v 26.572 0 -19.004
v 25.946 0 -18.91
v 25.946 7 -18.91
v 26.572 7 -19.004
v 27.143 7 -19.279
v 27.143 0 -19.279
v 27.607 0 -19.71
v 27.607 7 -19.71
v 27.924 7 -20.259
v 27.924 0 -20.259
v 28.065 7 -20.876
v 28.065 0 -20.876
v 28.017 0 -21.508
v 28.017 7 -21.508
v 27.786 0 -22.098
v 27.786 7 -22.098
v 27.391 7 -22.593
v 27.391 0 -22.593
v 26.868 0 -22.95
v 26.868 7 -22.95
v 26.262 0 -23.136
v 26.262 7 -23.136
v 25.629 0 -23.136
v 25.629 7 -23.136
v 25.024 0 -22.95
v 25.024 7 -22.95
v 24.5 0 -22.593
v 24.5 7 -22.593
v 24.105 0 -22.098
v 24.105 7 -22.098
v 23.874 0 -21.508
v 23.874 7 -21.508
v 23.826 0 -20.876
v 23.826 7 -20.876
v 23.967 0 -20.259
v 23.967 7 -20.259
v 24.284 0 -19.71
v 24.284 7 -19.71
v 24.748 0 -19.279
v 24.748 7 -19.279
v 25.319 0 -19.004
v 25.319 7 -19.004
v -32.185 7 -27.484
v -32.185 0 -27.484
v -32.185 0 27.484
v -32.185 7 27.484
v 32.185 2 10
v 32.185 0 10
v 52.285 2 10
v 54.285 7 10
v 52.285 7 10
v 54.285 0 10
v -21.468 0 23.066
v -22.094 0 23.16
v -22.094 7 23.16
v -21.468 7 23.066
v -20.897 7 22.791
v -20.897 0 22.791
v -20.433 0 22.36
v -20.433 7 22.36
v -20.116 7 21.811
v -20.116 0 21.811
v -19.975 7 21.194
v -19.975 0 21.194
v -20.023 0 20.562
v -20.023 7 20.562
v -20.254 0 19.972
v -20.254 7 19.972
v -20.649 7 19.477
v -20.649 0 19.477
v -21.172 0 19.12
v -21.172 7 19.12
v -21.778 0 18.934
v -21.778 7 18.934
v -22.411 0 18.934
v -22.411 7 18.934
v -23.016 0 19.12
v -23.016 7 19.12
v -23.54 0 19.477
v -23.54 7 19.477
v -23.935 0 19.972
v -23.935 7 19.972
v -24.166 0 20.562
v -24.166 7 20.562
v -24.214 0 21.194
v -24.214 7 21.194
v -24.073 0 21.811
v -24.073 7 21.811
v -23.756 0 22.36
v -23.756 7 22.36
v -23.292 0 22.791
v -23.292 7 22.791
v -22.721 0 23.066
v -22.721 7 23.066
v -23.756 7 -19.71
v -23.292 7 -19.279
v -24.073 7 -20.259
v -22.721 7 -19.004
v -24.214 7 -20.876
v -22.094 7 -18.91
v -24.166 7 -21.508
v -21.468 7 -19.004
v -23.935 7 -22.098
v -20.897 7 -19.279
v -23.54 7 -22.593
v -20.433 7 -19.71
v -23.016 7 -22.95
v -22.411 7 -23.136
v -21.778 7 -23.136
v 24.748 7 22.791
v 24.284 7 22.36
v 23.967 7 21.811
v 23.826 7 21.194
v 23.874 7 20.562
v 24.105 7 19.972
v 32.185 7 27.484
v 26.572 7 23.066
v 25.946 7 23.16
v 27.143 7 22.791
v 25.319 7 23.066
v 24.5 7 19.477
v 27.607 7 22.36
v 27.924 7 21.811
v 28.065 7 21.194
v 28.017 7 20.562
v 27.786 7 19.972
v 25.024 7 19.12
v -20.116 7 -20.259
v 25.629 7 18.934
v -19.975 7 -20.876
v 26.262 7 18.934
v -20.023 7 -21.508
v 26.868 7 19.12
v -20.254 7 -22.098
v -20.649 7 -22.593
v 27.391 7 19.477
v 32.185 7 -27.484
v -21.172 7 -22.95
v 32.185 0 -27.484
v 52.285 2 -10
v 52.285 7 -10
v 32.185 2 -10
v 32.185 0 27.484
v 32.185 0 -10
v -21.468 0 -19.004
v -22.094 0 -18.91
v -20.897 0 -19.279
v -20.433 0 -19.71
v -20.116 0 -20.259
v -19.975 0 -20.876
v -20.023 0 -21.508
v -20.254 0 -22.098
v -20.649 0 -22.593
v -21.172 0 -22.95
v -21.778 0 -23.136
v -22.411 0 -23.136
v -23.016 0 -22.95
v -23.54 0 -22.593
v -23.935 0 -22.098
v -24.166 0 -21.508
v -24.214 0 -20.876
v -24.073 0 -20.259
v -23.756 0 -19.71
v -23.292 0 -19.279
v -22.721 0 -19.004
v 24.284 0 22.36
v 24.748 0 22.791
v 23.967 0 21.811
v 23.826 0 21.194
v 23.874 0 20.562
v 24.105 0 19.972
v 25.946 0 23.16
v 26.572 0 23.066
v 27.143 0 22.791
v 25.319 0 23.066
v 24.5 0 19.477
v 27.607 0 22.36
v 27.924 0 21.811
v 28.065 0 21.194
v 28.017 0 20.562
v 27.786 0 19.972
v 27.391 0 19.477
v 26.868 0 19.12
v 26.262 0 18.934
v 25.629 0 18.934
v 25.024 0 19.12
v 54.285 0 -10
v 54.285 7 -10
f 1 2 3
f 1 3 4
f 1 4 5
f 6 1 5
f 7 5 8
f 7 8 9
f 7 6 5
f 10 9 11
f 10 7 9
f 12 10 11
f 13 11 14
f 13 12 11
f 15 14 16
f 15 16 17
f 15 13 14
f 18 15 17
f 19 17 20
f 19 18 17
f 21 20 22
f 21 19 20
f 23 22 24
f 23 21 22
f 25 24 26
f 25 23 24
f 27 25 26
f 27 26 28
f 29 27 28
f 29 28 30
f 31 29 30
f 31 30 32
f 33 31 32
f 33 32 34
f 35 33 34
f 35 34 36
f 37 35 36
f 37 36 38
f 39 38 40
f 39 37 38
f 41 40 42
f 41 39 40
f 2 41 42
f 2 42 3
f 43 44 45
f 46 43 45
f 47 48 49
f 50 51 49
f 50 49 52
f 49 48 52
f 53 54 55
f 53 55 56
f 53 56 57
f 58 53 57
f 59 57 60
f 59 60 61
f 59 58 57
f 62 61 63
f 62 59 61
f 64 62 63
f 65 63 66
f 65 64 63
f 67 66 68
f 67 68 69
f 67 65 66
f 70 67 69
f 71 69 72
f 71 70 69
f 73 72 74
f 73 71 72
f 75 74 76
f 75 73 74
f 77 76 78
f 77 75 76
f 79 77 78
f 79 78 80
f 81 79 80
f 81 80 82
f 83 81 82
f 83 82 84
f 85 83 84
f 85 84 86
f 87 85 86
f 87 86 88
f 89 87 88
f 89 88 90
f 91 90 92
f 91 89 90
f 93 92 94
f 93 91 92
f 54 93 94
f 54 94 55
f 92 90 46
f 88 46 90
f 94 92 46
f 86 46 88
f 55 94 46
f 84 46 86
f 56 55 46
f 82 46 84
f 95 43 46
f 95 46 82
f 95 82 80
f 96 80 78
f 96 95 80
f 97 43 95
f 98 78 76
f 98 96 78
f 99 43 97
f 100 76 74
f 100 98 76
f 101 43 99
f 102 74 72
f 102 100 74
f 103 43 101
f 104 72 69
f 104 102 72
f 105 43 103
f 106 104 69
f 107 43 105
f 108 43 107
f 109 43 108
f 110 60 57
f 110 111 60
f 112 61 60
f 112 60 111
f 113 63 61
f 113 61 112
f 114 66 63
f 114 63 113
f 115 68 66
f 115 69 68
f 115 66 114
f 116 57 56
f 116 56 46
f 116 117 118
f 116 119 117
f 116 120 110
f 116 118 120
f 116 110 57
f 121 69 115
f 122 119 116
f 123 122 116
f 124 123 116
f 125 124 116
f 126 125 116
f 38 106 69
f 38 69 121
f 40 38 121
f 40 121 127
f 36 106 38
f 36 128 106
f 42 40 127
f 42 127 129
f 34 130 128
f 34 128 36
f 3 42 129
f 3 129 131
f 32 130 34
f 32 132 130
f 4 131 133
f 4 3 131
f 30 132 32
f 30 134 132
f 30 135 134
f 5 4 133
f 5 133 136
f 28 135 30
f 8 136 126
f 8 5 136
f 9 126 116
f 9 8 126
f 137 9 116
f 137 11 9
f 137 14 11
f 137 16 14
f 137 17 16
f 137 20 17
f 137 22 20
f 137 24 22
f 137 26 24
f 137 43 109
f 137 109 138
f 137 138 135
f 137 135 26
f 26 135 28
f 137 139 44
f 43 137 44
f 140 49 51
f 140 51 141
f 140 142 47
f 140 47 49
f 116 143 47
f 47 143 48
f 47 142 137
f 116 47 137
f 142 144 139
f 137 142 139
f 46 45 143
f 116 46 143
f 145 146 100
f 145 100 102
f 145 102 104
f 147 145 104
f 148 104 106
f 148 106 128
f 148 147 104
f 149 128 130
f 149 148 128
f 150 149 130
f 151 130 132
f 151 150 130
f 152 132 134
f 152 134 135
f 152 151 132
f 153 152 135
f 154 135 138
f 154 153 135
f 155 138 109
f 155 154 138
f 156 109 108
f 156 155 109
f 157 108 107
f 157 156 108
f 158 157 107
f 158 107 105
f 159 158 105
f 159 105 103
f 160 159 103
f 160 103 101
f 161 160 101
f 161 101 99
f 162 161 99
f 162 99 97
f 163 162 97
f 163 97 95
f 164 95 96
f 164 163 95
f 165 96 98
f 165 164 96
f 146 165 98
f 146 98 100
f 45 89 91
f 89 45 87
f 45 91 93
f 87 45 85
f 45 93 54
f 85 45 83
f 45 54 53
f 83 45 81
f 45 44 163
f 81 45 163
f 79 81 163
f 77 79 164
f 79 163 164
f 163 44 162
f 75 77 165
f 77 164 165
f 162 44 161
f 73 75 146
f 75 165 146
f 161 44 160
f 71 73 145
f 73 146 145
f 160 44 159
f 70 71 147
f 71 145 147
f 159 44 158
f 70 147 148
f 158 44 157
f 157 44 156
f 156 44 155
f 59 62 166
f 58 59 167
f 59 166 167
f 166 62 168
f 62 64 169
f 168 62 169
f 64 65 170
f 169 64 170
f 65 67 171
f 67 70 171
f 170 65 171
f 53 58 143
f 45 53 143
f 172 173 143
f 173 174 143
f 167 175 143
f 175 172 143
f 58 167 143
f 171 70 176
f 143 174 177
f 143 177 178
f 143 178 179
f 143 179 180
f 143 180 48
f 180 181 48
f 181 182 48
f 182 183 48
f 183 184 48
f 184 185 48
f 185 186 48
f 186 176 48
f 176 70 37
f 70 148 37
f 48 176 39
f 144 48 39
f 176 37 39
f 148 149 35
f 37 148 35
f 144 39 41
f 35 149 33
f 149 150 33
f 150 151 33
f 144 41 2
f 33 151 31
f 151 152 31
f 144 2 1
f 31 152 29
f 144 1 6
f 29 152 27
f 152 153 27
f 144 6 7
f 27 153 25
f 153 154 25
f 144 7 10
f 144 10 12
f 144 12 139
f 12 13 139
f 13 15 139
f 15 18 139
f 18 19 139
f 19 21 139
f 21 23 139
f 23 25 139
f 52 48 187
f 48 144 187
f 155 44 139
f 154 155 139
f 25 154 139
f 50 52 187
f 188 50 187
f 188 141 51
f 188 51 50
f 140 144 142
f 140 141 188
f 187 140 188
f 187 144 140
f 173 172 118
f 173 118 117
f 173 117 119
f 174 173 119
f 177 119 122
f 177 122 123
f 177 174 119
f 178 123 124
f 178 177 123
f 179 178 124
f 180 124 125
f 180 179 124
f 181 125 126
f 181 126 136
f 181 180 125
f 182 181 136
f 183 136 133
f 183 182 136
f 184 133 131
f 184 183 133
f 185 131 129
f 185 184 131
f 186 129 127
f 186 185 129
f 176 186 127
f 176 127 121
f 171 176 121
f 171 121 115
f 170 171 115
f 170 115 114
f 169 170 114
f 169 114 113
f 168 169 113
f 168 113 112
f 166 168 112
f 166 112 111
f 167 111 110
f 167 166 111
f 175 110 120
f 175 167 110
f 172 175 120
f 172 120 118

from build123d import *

# Parameters (mm, degrees)
SKETCH1_W             = 64.370548606
SKETCH1_H             = 54.967832462
SKETCH1_R             = 2.125
BOSS_EXTRUDE1_DEPTH   = 7
SKETCH1_W_2           = 2
SKETCH1_H_2           = 20
BOSS_EXTRUDE1_2_DEPTH = 7
SKETCH1_3_W           = 20.1
SKETCH1_3_H           = 20
BOSS_EXTRUDE2_DEPTH   = 2


with BuildPart() as part:
    # Sketch1 → Boss-Extrude1 (new body)
    with BuildSketch(Plane(origin=(0, 0, 0), x_dir=(1, 0, 0), z_dir=(0, 1, 0))):
        Rectangle(SKETCH1_W, SKETCH1_H)
        with Locations((-22.09447199, -21.035)):
            Circle(SKETCH1_R, mode=Mode.SUBTRACT)
        with Locations((25.94552801, -21.035)):
            Circle(SKETCH1_R, mode=Mode.SUBTRACT)
        with Locations((-22.09447199, 21.035)):
            Circle(SKETCH1_R, mode=Mode.SUBTRACT)
        with Locations((25.94552801, 21.035)):
            Circle(SKETCH1_R, mode=Mode.SUBTRACT)
    extrude(amount=BOSS_EXTRUDE1_DEPTH)



with BuildPart() as body_2:
    # Sketch1 → Boss-Extrude1 2 (new body)
    with BuildSketch(Plane(origin=(0, 0, 0), x_dir=(1, 0, 0), z_dir=(0, 1, 0))):
        with Locations((53.285274303, 0)):
            Rectangle(SKETCH1_W_2, SKETCH1_H_2)
    extrude(amount=BOSS_EXTRUDE1_2_DEPTH)


with BuildPart() as part_1:
    add(part.part)

    add(body_2.part)  # Boss-Extrude2 merges body 2
    # Sketch1<3> → Boss-Extrude2 (add)
    with BuildSketch(Plane(origin=(0, 0, 0), x_dir=(1, 0, 0), z_dir=(0, 1, 0))):
        with Locations((42.235274303, 0)):
            Rectangle(SKETCH1_3_W, SKETCH1_3_H)
    extrude(amount=BOSS_EXTRUDE2_DEPTH)


solid = part_1.part
